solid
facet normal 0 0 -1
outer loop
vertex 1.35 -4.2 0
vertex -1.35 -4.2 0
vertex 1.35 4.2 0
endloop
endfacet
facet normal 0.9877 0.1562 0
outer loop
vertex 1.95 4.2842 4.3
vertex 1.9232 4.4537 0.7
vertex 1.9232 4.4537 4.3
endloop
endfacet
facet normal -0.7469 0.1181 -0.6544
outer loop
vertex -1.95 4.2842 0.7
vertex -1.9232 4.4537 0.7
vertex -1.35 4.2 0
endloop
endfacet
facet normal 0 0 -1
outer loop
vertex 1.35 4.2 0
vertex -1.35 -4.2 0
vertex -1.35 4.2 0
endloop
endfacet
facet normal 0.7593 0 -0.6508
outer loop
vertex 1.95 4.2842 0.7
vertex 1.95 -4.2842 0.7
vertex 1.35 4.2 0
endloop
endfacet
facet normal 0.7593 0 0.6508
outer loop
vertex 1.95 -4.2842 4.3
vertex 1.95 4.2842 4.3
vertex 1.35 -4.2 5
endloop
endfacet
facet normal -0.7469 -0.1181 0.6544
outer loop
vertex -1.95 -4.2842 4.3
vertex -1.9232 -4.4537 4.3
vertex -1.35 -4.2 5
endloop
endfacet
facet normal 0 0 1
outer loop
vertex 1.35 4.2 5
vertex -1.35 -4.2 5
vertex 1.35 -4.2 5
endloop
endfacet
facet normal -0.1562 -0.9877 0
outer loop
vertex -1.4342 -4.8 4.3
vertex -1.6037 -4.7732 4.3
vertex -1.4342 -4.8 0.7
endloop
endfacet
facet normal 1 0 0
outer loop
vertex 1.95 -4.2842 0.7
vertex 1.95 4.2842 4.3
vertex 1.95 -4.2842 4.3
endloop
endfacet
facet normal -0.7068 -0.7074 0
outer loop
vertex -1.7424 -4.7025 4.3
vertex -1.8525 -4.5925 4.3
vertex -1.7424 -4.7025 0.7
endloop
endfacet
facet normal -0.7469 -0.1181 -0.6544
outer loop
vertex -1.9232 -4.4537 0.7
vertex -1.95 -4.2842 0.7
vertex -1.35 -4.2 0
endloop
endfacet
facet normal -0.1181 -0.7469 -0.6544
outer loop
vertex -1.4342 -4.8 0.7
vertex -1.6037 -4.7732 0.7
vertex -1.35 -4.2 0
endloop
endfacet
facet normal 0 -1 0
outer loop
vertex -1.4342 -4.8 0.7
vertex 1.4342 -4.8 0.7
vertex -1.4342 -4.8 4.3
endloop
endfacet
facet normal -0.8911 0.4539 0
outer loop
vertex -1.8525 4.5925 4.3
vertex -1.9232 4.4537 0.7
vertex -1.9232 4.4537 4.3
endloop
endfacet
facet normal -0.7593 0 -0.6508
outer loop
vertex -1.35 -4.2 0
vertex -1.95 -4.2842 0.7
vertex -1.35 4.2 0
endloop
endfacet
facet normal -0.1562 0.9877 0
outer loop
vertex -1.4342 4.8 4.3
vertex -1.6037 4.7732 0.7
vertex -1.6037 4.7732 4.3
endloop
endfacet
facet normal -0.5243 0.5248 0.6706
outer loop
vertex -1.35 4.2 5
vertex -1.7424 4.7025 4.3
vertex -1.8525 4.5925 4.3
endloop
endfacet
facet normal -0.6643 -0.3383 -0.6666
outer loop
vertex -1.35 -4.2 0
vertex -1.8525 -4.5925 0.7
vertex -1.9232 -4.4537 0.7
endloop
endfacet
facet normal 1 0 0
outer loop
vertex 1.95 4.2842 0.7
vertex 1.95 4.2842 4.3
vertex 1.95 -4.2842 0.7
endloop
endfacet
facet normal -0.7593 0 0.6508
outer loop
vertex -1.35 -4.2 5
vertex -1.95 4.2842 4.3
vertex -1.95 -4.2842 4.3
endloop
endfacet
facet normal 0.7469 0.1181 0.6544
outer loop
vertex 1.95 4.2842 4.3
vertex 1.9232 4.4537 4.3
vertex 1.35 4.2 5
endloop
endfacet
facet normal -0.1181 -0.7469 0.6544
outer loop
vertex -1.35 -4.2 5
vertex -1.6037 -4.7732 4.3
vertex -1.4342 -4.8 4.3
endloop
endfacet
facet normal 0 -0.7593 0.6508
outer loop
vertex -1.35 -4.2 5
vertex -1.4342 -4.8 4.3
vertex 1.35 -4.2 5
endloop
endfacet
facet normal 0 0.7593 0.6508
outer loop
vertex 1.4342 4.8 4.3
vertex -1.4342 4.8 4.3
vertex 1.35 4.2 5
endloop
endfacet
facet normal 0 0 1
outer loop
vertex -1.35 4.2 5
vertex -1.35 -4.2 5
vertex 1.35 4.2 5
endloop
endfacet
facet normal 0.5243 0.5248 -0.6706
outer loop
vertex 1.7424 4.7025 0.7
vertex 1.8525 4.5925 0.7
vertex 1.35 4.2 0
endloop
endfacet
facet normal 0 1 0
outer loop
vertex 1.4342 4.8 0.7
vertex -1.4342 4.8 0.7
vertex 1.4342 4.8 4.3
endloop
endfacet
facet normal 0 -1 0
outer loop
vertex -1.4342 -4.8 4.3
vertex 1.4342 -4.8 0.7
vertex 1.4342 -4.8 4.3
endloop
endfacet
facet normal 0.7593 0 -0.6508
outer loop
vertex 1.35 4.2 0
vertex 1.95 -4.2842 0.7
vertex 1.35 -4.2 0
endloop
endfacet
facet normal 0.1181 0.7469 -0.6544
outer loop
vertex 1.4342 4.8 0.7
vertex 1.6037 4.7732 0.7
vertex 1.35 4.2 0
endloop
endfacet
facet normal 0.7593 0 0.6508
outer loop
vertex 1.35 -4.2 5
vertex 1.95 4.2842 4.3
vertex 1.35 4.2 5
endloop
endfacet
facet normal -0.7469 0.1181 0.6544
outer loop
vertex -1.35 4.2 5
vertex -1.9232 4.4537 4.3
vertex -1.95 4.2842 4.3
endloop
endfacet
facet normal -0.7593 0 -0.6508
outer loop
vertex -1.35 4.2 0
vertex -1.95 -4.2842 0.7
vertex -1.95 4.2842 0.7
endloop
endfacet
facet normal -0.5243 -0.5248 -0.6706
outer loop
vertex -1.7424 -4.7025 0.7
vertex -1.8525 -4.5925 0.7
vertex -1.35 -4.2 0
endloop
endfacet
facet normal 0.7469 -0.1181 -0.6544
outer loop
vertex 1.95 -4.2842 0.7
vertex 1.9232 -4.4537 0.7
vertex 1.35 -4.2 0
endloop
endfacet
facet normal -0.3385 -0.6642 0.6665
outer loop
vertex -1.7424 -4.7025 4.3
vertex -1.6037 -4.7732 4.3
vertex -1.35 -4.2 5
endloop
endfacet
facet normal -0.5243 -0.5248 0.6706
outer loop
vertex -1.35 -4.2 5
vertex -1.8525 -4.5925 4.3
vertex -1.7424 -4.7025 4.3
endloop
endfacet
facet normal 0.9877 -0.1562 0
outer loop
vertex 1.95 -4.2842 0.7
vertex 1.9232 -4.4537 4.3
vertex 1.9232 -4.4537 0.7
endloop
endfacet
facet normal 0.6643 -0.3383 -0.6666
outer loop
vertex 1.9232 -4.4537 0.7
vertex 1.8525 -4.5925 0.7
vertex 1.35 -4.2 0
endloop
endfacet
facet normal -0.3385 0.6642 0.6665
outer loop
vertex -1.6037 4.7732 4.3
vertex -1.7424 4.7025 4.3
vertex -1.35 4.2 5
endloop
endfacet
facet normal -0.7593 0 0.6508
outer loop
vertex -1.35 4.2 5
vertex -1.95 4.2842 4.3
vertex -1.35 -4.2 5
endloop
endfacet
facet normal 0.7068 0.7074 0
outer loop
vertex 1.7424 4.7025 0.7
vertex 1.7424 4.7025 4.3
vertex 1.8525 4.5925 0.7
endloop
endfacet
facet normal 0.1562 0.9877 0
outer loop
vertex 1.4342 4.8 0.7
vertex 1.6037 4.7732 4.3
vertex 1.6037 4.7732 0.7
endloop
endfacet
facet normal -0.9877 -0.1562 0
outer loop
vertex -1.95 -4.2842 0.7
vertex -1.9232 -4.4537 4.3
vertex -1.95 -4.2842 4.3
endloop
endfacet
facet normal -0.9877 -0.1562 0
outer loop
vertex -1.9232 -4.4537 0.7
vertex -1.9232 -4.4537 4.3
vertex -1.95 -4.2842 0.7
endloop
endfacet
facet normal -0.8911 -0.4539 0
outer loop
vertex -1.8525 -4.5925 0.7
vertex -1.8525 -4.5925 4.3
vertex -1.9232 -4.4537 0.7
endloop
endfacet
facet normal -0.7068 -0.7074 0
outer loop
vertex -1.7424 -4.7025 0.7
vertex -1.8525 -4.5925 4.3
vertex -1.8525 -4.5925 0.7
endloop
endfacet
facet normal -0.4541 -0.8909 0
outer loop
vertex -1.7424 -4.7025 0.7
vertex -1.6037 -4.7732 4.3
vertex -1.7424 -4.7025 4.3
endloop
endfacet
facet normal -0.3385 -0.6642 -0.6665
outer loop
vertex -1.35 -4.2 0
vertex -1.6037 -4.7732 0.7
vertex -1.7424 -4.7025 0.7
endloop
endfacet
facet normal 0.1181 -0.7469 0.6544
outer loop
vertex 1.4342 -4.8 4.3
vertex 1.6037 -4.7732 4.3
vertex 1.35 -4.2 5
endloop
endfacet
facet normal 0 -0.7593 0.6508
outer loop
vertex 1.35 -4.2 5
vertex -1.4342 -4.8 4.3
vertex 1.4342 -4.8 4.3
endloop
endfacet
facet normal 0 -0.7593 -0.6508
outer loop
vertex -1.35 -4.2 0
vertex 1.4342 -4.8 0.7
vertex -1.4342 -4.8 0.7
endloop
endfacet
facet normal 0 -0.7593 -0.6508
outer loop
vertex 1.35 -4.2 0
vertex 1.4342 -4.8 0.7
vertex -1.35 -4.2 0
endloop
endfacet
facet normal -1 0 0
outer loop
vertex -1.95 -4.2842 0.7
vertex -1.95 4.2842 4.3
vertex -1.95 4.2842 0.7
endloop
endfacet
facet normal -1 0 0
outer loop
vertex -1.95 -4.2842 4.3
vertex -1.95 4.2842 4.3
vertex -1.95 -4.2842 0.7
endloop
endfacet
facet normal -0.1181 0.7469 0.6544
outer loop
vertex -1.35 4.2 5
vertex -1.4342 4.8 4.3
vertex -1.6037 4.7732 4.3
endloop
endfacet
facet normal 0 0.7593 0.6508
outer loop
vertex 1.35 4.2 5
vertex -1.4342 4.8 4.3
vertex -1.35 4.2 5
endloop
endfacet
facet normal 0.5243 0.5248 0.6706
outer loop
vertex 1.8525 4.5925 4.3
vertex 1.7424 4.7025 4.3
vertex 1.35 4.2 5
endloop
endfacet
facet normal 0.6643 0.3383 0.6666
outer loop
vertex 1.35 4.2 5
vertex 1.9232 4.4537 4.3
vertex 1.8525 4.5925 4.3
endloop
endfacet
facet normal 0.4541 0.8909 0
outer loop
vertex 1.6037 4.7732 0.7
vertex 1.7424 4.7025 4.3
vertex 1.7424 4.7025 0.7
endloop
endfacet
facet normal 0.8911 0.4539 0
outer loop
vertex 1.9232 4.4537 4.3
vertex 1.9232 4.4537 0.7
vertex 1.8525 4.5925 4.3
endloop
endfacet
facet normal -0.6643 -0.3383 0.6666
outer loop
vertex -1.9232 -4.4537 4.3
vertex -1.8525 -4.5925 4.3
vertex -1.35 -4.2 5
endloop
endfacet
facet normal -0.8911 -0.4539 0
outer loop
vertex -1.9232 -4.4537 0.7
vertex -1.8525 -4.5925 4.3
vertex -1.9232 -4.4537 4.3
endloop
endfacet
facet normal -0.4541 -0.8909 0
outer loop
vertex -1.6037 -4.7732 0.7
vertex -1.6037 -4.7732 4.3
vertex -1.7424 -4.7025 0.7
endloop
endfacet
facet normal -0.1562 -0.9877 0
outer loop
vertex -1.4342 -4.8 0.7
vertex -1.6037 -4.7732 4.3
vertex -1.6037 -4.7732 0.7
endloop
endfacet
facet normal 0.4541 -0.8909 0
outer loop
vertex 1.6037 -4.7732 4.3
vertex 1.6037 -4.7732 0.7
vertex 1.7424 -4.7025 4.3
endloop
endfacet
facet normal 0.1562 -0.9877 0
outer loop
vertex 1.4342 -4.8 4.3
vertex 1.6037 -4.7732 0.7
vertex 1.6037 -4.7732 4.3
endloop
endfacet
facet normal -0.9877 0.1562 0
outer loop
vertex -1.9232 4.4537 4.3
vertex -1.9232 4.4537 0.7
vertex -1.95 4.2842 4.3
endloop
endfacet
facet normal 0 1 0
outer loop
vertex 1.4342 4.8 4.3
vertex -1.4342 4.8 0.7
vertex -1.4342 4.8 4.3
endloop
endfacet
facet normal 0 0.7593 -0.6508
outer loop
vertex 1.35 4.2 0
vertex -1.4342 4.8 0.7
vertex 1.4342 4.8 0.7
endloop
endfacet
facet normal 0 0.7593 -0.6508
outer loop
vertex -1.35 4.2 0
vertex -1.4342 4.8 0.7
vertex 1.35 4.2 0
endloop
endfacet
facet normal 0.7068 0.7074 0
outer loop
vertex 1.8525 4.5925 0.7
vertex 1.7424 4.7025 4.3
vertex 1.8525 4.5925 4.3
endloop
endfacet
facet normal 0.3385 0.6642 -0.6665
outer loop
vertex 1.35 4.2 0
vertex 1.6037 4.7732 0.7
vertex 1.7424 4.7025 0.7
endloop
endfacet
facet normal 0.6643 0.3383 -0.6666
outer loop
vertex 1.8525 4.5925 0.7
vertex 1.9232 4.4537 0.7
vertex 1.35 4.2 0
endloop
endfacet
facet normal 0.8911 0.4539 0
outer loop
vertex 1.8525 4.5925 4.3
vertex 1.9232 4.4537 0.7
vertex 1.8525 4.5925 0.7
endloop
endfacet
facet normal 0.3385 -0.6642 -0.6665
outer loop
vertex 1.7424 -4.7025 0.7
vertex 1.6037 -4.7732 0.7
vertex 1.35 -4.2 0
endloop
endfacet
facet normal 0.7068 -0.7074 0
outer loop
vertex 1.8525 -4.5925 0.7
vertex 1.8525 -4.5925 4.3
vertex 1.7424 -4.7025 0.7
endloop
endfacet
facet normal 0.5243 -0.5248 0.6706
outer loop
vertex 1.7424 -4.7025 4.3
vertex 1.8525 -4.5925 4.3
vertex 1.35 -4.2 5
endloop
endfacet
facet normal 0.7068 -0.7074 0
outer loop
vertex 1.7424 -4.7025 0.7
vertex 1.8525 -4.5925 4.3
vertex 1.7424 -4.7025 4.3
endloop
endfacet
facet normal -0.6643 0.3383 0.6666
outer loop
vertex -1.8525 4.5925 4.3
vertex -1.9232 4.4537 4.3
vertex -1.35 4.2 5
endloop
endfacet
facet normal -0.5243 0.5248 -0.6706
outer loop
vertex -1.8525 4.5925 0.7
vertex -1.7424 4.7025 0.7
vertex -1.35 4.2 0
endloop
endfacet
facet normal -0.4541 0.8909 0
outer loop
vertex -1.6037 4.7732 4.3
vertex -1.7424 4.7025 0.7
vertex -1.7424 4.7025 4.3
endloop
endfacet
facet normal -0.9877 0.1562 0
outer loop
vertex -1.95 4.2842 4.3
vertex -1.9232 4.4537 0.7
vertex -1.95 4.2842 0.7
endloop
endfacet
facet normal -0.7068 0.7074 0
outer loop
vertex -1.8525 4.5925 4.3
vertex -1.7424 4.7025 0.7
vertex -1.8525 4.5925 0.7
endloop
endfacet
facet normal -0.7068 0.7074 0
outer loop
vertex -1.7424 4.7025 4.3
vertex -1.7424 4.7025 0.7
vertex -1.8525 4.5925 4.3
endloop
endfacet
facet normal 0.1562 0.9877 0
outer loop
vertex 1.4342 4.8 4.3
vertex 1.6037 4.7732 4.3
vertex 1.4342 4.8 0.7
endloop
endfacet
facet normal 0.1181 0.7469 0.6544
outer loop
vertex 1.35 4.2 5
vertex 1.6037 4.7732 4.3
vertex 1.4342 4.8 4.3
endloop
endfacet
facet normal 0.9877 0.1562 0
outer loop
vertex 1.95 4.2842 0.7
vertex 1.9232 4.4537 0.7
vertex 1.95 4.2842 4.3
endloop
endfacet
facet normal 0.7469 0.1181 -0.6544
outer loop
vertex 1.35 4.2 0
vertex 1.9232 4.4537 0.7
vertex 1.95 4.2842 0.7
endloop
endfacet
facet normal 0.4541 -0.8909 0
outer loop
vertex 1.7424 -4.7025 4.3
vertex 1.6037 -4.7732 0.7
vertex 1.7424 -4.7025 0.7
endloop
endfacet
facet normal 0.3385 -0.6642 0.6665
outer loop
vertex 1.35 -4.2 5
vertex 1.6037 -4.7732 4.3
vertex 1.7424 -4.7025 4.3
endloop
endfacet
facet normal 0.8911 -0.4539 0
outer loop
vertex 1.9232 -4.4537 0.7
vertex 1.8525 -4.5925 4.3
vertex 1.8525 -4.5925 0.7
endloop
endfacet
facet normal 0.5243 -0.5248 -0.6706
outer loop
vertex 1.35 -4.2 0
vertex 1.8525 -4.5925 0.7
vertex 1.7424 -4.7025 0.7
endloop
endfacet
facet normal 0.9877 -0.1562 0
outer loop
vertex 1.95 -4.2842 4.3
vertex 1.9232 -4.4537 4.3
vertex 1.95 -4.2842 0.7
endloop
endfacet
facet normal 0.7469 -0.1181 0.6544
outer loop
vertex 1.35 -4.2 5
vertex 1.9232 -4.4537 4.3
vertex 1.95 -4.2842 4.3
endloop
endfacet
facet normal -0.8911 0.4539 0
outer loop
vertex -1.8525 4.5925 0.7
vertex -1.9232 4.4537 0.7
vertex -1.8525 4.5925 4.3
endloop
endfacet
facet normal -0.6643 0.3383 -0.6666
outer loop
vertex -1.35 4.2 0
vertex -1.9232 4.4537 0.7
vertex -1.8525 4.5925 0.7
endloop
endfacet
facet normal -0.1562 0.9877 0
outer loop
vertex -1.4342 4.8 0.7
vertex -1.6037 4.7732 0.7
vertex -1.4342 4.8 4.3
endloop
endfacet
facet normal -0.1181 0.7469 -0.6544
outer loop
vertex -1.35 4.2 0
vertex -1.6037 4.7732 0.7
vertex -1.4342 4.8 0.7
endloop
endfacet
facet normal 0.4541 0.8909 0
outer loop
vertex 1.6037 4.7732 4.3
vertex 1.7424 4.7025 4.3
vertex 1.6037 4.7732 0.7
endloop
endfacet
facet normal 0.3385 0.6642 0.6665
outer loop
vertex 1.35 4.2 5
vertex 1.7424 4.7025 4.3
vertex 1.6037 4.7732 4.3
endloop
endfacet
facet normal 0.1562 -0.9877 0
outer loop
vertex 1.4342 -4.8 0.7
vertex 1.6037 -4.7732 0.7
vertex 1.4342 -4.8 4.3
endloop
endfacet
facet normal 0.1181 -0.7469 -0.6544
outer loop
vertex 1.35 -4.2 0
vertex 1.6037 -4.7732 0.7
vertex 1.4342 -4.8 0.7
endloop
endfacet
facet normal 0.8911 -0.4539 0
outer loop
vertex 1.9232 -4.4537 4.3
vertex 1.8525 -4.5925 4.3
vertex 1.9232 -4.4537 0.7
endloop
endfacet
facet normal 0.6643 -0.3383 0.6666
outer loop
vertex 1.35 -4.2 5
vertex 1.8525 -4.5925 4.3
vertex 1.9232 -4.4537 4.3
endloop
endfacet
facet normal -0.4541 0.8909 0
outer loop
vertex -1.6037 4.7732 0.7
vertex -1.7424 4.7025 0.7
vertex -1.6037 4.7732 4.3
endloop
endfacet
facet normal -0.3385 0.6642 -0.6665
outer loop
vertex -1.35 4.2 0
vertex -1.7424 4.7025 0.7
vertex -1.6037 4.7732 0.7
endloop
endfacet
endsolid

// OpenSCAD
module bevel_extrude(h, i=0) {
  face = h/(1+sqrt(2));
  bevel = (h-face)/2;
  offs = i*0.2;
  
  if (i == 0) {
    translate([0, 0, -h/2])
    linear_extrude(h)
    offset(-bevel)
    children();
  }

  if (offs < bevel) {
    translate([0, 0, bevel-offs-h/2])
    linear_extrude(h - 2*(bevel-offs))
    offset(-offs)
    children();
    
    // Recurse.
    bevel_extrude(h, i+1)
    children();
  }
}

gauge = 3.6;

module link(od) {
  $fn = od;
  
  difference() {
    bevel_extrude(gauge)
    difference() {
      union() {
        circle(d=od);
        
        // Nubs to provide extra material for welding.
        translate([gauge/2-od/2, 0, 0])
        square([gauge*1.2, 3], center=true);
      }
      circle(d=od-2*gauge);
    }
    
    translate([-od/2, 0, 0])
    cube([od, 0.6, od], center=true);
  }
}

module main_link() {
  link(26.3);
}

module border_link() {
  link(23);
}

module hole_2d(dim) {
  $fn = 30;

  scale(dim)
  circle(d=1);
}

plate_od = 50;

module holes_2d() {
  for (a = [-1, 1], b = [-1, 1])
  scale([a, b])
  translate([7, plate_od/2-9.1])
  hole_2d([6.6, 10.3]);
}

half_plate_height = 32;

module plate(ridge=true, half=false) {
  bevel_extrude(gauge)
  difference() {
    circle(d=plate_od);
    
    // Slightly cut off the sides.
    for (a = [-1, 1])
    translate([0, a*(50+plate_od/2-1.5)])
    square(100, center=true);
    
    // Holes.
    holes_2d();
    
    // A half-plate for housing magnets.
    if(half) {
      translate([0, plate_od/2+7.8])
      square([plate_od, plate_od], center=true);

      for (a = [-1, 1])
      scale([a, 1]) {
        translate([half_plate_height/2, 7.8])
        rotate([0, 0, 45])
        square(1.7, center=true);
        
        translate([(plate_od+half_plate_height)/2, 0])
        square([plate_od, plate_od], center=true);
      }
    }
  }
  
  if(ridge)
  translate([6, 0, gauge/2-0.001])
  linear_extrude(gauge*0.6, scale=0)
  scale(plate_od * [0.62, 0.35])
  rotate([0, 0, 45])
  square(1/sqrt(2), center=true);
}

module shoulder_plate() {
  difference() {
    union() {
      bevel_extrude(gauge)
      difference() {
        offset(gauge*0.86)
        hull()
        holes_2d();
        
        holes_2d();
      }
      
      translate([0, 0, gauge/2-0.001])
      linear_extrude(gauge*0.6, scale=0)
      scale(plate_od * [0.47, 0.31])
      rotate([0, 0, 45])
      square(1/sqrt(2), center=true);
    }
  
    translate([plate_od*0.66, 0, -5])
    cylinder($fn=60, h=10, d=plate_od*0.95);
  }
}

magnet_hole_depth = 2.2;
magnet_hole_id = 10.4;
magnet_hole_floor = 0.6;

cover_plate_dims = [28, 12.5];
cover_plate_thickness = 1;
cover_plate_roundoff = 3;

module stud_2d() {
  $fn = 20;

  offset(0.7)
  offset(-0.7)
  square([4.3, 10], center=true);
}

module magnet_plate(tab=false) {
  $fn = 60;
  magnet_hole_slack = 0.4;

  difference() {
    union() {
      plate(ridge=false, half=true);
      
      if(tab)
      translate([0, 5.5, 0.4])
      rotate([135, 0, 0])
      intersection() {
        tab_length = 6;

        bevel_extrude(gauge)
        square([half_plate_height, tab_length*2], center=true);
        
        translate([0, -tab_length])
        cube([half_plate_height, tab_length*2, gauge], center=true);
      }
    }
    
    for (a = [-1, 1])
    scale([a, 1, 1])    
    translate([8.5, 0, gauge/2-5-magnet_hole_floor])
    cylinder(d=magnet_hole_slack+9.5+0.5*a, h=5);
    
    translate([0, 0, -5])
    linear_extrude(10)
    offset(0.2)
    stud_2d();
    
    translate([0, 0, cover_plate_thickness-5-gauge/2])
    linear_extrude(5)
    offset(cover_plate_roundoff)
    offset(-cover_plate_roundoff)
    square(cover_plate_dims, center=true);
  }
}

module magnet_plate_cover() {
  $fn = 60;

  linear_extrude(cover_plate_thickness-0.2)
  offset(cover_plate_roundoff-0.35)
  offset(-cover_plate_roundoff)
  square(cover_plate_dims, center=true);
}

module magnet_plate_stud() {
  hull() {
    linear_extrude(5)
    offset(-0.8)
    stud_2d();
    
    translate([-0, 0, 0.7])
    linear_extrude(3.6)
    offset(-0.2)
    stud_2d();
  }
}

module print_magnet_plates() {
  magnet_plate(tab=true);
  
  translate([34, 0])
  magnet_plate();
}

magnet_plate_stud();
